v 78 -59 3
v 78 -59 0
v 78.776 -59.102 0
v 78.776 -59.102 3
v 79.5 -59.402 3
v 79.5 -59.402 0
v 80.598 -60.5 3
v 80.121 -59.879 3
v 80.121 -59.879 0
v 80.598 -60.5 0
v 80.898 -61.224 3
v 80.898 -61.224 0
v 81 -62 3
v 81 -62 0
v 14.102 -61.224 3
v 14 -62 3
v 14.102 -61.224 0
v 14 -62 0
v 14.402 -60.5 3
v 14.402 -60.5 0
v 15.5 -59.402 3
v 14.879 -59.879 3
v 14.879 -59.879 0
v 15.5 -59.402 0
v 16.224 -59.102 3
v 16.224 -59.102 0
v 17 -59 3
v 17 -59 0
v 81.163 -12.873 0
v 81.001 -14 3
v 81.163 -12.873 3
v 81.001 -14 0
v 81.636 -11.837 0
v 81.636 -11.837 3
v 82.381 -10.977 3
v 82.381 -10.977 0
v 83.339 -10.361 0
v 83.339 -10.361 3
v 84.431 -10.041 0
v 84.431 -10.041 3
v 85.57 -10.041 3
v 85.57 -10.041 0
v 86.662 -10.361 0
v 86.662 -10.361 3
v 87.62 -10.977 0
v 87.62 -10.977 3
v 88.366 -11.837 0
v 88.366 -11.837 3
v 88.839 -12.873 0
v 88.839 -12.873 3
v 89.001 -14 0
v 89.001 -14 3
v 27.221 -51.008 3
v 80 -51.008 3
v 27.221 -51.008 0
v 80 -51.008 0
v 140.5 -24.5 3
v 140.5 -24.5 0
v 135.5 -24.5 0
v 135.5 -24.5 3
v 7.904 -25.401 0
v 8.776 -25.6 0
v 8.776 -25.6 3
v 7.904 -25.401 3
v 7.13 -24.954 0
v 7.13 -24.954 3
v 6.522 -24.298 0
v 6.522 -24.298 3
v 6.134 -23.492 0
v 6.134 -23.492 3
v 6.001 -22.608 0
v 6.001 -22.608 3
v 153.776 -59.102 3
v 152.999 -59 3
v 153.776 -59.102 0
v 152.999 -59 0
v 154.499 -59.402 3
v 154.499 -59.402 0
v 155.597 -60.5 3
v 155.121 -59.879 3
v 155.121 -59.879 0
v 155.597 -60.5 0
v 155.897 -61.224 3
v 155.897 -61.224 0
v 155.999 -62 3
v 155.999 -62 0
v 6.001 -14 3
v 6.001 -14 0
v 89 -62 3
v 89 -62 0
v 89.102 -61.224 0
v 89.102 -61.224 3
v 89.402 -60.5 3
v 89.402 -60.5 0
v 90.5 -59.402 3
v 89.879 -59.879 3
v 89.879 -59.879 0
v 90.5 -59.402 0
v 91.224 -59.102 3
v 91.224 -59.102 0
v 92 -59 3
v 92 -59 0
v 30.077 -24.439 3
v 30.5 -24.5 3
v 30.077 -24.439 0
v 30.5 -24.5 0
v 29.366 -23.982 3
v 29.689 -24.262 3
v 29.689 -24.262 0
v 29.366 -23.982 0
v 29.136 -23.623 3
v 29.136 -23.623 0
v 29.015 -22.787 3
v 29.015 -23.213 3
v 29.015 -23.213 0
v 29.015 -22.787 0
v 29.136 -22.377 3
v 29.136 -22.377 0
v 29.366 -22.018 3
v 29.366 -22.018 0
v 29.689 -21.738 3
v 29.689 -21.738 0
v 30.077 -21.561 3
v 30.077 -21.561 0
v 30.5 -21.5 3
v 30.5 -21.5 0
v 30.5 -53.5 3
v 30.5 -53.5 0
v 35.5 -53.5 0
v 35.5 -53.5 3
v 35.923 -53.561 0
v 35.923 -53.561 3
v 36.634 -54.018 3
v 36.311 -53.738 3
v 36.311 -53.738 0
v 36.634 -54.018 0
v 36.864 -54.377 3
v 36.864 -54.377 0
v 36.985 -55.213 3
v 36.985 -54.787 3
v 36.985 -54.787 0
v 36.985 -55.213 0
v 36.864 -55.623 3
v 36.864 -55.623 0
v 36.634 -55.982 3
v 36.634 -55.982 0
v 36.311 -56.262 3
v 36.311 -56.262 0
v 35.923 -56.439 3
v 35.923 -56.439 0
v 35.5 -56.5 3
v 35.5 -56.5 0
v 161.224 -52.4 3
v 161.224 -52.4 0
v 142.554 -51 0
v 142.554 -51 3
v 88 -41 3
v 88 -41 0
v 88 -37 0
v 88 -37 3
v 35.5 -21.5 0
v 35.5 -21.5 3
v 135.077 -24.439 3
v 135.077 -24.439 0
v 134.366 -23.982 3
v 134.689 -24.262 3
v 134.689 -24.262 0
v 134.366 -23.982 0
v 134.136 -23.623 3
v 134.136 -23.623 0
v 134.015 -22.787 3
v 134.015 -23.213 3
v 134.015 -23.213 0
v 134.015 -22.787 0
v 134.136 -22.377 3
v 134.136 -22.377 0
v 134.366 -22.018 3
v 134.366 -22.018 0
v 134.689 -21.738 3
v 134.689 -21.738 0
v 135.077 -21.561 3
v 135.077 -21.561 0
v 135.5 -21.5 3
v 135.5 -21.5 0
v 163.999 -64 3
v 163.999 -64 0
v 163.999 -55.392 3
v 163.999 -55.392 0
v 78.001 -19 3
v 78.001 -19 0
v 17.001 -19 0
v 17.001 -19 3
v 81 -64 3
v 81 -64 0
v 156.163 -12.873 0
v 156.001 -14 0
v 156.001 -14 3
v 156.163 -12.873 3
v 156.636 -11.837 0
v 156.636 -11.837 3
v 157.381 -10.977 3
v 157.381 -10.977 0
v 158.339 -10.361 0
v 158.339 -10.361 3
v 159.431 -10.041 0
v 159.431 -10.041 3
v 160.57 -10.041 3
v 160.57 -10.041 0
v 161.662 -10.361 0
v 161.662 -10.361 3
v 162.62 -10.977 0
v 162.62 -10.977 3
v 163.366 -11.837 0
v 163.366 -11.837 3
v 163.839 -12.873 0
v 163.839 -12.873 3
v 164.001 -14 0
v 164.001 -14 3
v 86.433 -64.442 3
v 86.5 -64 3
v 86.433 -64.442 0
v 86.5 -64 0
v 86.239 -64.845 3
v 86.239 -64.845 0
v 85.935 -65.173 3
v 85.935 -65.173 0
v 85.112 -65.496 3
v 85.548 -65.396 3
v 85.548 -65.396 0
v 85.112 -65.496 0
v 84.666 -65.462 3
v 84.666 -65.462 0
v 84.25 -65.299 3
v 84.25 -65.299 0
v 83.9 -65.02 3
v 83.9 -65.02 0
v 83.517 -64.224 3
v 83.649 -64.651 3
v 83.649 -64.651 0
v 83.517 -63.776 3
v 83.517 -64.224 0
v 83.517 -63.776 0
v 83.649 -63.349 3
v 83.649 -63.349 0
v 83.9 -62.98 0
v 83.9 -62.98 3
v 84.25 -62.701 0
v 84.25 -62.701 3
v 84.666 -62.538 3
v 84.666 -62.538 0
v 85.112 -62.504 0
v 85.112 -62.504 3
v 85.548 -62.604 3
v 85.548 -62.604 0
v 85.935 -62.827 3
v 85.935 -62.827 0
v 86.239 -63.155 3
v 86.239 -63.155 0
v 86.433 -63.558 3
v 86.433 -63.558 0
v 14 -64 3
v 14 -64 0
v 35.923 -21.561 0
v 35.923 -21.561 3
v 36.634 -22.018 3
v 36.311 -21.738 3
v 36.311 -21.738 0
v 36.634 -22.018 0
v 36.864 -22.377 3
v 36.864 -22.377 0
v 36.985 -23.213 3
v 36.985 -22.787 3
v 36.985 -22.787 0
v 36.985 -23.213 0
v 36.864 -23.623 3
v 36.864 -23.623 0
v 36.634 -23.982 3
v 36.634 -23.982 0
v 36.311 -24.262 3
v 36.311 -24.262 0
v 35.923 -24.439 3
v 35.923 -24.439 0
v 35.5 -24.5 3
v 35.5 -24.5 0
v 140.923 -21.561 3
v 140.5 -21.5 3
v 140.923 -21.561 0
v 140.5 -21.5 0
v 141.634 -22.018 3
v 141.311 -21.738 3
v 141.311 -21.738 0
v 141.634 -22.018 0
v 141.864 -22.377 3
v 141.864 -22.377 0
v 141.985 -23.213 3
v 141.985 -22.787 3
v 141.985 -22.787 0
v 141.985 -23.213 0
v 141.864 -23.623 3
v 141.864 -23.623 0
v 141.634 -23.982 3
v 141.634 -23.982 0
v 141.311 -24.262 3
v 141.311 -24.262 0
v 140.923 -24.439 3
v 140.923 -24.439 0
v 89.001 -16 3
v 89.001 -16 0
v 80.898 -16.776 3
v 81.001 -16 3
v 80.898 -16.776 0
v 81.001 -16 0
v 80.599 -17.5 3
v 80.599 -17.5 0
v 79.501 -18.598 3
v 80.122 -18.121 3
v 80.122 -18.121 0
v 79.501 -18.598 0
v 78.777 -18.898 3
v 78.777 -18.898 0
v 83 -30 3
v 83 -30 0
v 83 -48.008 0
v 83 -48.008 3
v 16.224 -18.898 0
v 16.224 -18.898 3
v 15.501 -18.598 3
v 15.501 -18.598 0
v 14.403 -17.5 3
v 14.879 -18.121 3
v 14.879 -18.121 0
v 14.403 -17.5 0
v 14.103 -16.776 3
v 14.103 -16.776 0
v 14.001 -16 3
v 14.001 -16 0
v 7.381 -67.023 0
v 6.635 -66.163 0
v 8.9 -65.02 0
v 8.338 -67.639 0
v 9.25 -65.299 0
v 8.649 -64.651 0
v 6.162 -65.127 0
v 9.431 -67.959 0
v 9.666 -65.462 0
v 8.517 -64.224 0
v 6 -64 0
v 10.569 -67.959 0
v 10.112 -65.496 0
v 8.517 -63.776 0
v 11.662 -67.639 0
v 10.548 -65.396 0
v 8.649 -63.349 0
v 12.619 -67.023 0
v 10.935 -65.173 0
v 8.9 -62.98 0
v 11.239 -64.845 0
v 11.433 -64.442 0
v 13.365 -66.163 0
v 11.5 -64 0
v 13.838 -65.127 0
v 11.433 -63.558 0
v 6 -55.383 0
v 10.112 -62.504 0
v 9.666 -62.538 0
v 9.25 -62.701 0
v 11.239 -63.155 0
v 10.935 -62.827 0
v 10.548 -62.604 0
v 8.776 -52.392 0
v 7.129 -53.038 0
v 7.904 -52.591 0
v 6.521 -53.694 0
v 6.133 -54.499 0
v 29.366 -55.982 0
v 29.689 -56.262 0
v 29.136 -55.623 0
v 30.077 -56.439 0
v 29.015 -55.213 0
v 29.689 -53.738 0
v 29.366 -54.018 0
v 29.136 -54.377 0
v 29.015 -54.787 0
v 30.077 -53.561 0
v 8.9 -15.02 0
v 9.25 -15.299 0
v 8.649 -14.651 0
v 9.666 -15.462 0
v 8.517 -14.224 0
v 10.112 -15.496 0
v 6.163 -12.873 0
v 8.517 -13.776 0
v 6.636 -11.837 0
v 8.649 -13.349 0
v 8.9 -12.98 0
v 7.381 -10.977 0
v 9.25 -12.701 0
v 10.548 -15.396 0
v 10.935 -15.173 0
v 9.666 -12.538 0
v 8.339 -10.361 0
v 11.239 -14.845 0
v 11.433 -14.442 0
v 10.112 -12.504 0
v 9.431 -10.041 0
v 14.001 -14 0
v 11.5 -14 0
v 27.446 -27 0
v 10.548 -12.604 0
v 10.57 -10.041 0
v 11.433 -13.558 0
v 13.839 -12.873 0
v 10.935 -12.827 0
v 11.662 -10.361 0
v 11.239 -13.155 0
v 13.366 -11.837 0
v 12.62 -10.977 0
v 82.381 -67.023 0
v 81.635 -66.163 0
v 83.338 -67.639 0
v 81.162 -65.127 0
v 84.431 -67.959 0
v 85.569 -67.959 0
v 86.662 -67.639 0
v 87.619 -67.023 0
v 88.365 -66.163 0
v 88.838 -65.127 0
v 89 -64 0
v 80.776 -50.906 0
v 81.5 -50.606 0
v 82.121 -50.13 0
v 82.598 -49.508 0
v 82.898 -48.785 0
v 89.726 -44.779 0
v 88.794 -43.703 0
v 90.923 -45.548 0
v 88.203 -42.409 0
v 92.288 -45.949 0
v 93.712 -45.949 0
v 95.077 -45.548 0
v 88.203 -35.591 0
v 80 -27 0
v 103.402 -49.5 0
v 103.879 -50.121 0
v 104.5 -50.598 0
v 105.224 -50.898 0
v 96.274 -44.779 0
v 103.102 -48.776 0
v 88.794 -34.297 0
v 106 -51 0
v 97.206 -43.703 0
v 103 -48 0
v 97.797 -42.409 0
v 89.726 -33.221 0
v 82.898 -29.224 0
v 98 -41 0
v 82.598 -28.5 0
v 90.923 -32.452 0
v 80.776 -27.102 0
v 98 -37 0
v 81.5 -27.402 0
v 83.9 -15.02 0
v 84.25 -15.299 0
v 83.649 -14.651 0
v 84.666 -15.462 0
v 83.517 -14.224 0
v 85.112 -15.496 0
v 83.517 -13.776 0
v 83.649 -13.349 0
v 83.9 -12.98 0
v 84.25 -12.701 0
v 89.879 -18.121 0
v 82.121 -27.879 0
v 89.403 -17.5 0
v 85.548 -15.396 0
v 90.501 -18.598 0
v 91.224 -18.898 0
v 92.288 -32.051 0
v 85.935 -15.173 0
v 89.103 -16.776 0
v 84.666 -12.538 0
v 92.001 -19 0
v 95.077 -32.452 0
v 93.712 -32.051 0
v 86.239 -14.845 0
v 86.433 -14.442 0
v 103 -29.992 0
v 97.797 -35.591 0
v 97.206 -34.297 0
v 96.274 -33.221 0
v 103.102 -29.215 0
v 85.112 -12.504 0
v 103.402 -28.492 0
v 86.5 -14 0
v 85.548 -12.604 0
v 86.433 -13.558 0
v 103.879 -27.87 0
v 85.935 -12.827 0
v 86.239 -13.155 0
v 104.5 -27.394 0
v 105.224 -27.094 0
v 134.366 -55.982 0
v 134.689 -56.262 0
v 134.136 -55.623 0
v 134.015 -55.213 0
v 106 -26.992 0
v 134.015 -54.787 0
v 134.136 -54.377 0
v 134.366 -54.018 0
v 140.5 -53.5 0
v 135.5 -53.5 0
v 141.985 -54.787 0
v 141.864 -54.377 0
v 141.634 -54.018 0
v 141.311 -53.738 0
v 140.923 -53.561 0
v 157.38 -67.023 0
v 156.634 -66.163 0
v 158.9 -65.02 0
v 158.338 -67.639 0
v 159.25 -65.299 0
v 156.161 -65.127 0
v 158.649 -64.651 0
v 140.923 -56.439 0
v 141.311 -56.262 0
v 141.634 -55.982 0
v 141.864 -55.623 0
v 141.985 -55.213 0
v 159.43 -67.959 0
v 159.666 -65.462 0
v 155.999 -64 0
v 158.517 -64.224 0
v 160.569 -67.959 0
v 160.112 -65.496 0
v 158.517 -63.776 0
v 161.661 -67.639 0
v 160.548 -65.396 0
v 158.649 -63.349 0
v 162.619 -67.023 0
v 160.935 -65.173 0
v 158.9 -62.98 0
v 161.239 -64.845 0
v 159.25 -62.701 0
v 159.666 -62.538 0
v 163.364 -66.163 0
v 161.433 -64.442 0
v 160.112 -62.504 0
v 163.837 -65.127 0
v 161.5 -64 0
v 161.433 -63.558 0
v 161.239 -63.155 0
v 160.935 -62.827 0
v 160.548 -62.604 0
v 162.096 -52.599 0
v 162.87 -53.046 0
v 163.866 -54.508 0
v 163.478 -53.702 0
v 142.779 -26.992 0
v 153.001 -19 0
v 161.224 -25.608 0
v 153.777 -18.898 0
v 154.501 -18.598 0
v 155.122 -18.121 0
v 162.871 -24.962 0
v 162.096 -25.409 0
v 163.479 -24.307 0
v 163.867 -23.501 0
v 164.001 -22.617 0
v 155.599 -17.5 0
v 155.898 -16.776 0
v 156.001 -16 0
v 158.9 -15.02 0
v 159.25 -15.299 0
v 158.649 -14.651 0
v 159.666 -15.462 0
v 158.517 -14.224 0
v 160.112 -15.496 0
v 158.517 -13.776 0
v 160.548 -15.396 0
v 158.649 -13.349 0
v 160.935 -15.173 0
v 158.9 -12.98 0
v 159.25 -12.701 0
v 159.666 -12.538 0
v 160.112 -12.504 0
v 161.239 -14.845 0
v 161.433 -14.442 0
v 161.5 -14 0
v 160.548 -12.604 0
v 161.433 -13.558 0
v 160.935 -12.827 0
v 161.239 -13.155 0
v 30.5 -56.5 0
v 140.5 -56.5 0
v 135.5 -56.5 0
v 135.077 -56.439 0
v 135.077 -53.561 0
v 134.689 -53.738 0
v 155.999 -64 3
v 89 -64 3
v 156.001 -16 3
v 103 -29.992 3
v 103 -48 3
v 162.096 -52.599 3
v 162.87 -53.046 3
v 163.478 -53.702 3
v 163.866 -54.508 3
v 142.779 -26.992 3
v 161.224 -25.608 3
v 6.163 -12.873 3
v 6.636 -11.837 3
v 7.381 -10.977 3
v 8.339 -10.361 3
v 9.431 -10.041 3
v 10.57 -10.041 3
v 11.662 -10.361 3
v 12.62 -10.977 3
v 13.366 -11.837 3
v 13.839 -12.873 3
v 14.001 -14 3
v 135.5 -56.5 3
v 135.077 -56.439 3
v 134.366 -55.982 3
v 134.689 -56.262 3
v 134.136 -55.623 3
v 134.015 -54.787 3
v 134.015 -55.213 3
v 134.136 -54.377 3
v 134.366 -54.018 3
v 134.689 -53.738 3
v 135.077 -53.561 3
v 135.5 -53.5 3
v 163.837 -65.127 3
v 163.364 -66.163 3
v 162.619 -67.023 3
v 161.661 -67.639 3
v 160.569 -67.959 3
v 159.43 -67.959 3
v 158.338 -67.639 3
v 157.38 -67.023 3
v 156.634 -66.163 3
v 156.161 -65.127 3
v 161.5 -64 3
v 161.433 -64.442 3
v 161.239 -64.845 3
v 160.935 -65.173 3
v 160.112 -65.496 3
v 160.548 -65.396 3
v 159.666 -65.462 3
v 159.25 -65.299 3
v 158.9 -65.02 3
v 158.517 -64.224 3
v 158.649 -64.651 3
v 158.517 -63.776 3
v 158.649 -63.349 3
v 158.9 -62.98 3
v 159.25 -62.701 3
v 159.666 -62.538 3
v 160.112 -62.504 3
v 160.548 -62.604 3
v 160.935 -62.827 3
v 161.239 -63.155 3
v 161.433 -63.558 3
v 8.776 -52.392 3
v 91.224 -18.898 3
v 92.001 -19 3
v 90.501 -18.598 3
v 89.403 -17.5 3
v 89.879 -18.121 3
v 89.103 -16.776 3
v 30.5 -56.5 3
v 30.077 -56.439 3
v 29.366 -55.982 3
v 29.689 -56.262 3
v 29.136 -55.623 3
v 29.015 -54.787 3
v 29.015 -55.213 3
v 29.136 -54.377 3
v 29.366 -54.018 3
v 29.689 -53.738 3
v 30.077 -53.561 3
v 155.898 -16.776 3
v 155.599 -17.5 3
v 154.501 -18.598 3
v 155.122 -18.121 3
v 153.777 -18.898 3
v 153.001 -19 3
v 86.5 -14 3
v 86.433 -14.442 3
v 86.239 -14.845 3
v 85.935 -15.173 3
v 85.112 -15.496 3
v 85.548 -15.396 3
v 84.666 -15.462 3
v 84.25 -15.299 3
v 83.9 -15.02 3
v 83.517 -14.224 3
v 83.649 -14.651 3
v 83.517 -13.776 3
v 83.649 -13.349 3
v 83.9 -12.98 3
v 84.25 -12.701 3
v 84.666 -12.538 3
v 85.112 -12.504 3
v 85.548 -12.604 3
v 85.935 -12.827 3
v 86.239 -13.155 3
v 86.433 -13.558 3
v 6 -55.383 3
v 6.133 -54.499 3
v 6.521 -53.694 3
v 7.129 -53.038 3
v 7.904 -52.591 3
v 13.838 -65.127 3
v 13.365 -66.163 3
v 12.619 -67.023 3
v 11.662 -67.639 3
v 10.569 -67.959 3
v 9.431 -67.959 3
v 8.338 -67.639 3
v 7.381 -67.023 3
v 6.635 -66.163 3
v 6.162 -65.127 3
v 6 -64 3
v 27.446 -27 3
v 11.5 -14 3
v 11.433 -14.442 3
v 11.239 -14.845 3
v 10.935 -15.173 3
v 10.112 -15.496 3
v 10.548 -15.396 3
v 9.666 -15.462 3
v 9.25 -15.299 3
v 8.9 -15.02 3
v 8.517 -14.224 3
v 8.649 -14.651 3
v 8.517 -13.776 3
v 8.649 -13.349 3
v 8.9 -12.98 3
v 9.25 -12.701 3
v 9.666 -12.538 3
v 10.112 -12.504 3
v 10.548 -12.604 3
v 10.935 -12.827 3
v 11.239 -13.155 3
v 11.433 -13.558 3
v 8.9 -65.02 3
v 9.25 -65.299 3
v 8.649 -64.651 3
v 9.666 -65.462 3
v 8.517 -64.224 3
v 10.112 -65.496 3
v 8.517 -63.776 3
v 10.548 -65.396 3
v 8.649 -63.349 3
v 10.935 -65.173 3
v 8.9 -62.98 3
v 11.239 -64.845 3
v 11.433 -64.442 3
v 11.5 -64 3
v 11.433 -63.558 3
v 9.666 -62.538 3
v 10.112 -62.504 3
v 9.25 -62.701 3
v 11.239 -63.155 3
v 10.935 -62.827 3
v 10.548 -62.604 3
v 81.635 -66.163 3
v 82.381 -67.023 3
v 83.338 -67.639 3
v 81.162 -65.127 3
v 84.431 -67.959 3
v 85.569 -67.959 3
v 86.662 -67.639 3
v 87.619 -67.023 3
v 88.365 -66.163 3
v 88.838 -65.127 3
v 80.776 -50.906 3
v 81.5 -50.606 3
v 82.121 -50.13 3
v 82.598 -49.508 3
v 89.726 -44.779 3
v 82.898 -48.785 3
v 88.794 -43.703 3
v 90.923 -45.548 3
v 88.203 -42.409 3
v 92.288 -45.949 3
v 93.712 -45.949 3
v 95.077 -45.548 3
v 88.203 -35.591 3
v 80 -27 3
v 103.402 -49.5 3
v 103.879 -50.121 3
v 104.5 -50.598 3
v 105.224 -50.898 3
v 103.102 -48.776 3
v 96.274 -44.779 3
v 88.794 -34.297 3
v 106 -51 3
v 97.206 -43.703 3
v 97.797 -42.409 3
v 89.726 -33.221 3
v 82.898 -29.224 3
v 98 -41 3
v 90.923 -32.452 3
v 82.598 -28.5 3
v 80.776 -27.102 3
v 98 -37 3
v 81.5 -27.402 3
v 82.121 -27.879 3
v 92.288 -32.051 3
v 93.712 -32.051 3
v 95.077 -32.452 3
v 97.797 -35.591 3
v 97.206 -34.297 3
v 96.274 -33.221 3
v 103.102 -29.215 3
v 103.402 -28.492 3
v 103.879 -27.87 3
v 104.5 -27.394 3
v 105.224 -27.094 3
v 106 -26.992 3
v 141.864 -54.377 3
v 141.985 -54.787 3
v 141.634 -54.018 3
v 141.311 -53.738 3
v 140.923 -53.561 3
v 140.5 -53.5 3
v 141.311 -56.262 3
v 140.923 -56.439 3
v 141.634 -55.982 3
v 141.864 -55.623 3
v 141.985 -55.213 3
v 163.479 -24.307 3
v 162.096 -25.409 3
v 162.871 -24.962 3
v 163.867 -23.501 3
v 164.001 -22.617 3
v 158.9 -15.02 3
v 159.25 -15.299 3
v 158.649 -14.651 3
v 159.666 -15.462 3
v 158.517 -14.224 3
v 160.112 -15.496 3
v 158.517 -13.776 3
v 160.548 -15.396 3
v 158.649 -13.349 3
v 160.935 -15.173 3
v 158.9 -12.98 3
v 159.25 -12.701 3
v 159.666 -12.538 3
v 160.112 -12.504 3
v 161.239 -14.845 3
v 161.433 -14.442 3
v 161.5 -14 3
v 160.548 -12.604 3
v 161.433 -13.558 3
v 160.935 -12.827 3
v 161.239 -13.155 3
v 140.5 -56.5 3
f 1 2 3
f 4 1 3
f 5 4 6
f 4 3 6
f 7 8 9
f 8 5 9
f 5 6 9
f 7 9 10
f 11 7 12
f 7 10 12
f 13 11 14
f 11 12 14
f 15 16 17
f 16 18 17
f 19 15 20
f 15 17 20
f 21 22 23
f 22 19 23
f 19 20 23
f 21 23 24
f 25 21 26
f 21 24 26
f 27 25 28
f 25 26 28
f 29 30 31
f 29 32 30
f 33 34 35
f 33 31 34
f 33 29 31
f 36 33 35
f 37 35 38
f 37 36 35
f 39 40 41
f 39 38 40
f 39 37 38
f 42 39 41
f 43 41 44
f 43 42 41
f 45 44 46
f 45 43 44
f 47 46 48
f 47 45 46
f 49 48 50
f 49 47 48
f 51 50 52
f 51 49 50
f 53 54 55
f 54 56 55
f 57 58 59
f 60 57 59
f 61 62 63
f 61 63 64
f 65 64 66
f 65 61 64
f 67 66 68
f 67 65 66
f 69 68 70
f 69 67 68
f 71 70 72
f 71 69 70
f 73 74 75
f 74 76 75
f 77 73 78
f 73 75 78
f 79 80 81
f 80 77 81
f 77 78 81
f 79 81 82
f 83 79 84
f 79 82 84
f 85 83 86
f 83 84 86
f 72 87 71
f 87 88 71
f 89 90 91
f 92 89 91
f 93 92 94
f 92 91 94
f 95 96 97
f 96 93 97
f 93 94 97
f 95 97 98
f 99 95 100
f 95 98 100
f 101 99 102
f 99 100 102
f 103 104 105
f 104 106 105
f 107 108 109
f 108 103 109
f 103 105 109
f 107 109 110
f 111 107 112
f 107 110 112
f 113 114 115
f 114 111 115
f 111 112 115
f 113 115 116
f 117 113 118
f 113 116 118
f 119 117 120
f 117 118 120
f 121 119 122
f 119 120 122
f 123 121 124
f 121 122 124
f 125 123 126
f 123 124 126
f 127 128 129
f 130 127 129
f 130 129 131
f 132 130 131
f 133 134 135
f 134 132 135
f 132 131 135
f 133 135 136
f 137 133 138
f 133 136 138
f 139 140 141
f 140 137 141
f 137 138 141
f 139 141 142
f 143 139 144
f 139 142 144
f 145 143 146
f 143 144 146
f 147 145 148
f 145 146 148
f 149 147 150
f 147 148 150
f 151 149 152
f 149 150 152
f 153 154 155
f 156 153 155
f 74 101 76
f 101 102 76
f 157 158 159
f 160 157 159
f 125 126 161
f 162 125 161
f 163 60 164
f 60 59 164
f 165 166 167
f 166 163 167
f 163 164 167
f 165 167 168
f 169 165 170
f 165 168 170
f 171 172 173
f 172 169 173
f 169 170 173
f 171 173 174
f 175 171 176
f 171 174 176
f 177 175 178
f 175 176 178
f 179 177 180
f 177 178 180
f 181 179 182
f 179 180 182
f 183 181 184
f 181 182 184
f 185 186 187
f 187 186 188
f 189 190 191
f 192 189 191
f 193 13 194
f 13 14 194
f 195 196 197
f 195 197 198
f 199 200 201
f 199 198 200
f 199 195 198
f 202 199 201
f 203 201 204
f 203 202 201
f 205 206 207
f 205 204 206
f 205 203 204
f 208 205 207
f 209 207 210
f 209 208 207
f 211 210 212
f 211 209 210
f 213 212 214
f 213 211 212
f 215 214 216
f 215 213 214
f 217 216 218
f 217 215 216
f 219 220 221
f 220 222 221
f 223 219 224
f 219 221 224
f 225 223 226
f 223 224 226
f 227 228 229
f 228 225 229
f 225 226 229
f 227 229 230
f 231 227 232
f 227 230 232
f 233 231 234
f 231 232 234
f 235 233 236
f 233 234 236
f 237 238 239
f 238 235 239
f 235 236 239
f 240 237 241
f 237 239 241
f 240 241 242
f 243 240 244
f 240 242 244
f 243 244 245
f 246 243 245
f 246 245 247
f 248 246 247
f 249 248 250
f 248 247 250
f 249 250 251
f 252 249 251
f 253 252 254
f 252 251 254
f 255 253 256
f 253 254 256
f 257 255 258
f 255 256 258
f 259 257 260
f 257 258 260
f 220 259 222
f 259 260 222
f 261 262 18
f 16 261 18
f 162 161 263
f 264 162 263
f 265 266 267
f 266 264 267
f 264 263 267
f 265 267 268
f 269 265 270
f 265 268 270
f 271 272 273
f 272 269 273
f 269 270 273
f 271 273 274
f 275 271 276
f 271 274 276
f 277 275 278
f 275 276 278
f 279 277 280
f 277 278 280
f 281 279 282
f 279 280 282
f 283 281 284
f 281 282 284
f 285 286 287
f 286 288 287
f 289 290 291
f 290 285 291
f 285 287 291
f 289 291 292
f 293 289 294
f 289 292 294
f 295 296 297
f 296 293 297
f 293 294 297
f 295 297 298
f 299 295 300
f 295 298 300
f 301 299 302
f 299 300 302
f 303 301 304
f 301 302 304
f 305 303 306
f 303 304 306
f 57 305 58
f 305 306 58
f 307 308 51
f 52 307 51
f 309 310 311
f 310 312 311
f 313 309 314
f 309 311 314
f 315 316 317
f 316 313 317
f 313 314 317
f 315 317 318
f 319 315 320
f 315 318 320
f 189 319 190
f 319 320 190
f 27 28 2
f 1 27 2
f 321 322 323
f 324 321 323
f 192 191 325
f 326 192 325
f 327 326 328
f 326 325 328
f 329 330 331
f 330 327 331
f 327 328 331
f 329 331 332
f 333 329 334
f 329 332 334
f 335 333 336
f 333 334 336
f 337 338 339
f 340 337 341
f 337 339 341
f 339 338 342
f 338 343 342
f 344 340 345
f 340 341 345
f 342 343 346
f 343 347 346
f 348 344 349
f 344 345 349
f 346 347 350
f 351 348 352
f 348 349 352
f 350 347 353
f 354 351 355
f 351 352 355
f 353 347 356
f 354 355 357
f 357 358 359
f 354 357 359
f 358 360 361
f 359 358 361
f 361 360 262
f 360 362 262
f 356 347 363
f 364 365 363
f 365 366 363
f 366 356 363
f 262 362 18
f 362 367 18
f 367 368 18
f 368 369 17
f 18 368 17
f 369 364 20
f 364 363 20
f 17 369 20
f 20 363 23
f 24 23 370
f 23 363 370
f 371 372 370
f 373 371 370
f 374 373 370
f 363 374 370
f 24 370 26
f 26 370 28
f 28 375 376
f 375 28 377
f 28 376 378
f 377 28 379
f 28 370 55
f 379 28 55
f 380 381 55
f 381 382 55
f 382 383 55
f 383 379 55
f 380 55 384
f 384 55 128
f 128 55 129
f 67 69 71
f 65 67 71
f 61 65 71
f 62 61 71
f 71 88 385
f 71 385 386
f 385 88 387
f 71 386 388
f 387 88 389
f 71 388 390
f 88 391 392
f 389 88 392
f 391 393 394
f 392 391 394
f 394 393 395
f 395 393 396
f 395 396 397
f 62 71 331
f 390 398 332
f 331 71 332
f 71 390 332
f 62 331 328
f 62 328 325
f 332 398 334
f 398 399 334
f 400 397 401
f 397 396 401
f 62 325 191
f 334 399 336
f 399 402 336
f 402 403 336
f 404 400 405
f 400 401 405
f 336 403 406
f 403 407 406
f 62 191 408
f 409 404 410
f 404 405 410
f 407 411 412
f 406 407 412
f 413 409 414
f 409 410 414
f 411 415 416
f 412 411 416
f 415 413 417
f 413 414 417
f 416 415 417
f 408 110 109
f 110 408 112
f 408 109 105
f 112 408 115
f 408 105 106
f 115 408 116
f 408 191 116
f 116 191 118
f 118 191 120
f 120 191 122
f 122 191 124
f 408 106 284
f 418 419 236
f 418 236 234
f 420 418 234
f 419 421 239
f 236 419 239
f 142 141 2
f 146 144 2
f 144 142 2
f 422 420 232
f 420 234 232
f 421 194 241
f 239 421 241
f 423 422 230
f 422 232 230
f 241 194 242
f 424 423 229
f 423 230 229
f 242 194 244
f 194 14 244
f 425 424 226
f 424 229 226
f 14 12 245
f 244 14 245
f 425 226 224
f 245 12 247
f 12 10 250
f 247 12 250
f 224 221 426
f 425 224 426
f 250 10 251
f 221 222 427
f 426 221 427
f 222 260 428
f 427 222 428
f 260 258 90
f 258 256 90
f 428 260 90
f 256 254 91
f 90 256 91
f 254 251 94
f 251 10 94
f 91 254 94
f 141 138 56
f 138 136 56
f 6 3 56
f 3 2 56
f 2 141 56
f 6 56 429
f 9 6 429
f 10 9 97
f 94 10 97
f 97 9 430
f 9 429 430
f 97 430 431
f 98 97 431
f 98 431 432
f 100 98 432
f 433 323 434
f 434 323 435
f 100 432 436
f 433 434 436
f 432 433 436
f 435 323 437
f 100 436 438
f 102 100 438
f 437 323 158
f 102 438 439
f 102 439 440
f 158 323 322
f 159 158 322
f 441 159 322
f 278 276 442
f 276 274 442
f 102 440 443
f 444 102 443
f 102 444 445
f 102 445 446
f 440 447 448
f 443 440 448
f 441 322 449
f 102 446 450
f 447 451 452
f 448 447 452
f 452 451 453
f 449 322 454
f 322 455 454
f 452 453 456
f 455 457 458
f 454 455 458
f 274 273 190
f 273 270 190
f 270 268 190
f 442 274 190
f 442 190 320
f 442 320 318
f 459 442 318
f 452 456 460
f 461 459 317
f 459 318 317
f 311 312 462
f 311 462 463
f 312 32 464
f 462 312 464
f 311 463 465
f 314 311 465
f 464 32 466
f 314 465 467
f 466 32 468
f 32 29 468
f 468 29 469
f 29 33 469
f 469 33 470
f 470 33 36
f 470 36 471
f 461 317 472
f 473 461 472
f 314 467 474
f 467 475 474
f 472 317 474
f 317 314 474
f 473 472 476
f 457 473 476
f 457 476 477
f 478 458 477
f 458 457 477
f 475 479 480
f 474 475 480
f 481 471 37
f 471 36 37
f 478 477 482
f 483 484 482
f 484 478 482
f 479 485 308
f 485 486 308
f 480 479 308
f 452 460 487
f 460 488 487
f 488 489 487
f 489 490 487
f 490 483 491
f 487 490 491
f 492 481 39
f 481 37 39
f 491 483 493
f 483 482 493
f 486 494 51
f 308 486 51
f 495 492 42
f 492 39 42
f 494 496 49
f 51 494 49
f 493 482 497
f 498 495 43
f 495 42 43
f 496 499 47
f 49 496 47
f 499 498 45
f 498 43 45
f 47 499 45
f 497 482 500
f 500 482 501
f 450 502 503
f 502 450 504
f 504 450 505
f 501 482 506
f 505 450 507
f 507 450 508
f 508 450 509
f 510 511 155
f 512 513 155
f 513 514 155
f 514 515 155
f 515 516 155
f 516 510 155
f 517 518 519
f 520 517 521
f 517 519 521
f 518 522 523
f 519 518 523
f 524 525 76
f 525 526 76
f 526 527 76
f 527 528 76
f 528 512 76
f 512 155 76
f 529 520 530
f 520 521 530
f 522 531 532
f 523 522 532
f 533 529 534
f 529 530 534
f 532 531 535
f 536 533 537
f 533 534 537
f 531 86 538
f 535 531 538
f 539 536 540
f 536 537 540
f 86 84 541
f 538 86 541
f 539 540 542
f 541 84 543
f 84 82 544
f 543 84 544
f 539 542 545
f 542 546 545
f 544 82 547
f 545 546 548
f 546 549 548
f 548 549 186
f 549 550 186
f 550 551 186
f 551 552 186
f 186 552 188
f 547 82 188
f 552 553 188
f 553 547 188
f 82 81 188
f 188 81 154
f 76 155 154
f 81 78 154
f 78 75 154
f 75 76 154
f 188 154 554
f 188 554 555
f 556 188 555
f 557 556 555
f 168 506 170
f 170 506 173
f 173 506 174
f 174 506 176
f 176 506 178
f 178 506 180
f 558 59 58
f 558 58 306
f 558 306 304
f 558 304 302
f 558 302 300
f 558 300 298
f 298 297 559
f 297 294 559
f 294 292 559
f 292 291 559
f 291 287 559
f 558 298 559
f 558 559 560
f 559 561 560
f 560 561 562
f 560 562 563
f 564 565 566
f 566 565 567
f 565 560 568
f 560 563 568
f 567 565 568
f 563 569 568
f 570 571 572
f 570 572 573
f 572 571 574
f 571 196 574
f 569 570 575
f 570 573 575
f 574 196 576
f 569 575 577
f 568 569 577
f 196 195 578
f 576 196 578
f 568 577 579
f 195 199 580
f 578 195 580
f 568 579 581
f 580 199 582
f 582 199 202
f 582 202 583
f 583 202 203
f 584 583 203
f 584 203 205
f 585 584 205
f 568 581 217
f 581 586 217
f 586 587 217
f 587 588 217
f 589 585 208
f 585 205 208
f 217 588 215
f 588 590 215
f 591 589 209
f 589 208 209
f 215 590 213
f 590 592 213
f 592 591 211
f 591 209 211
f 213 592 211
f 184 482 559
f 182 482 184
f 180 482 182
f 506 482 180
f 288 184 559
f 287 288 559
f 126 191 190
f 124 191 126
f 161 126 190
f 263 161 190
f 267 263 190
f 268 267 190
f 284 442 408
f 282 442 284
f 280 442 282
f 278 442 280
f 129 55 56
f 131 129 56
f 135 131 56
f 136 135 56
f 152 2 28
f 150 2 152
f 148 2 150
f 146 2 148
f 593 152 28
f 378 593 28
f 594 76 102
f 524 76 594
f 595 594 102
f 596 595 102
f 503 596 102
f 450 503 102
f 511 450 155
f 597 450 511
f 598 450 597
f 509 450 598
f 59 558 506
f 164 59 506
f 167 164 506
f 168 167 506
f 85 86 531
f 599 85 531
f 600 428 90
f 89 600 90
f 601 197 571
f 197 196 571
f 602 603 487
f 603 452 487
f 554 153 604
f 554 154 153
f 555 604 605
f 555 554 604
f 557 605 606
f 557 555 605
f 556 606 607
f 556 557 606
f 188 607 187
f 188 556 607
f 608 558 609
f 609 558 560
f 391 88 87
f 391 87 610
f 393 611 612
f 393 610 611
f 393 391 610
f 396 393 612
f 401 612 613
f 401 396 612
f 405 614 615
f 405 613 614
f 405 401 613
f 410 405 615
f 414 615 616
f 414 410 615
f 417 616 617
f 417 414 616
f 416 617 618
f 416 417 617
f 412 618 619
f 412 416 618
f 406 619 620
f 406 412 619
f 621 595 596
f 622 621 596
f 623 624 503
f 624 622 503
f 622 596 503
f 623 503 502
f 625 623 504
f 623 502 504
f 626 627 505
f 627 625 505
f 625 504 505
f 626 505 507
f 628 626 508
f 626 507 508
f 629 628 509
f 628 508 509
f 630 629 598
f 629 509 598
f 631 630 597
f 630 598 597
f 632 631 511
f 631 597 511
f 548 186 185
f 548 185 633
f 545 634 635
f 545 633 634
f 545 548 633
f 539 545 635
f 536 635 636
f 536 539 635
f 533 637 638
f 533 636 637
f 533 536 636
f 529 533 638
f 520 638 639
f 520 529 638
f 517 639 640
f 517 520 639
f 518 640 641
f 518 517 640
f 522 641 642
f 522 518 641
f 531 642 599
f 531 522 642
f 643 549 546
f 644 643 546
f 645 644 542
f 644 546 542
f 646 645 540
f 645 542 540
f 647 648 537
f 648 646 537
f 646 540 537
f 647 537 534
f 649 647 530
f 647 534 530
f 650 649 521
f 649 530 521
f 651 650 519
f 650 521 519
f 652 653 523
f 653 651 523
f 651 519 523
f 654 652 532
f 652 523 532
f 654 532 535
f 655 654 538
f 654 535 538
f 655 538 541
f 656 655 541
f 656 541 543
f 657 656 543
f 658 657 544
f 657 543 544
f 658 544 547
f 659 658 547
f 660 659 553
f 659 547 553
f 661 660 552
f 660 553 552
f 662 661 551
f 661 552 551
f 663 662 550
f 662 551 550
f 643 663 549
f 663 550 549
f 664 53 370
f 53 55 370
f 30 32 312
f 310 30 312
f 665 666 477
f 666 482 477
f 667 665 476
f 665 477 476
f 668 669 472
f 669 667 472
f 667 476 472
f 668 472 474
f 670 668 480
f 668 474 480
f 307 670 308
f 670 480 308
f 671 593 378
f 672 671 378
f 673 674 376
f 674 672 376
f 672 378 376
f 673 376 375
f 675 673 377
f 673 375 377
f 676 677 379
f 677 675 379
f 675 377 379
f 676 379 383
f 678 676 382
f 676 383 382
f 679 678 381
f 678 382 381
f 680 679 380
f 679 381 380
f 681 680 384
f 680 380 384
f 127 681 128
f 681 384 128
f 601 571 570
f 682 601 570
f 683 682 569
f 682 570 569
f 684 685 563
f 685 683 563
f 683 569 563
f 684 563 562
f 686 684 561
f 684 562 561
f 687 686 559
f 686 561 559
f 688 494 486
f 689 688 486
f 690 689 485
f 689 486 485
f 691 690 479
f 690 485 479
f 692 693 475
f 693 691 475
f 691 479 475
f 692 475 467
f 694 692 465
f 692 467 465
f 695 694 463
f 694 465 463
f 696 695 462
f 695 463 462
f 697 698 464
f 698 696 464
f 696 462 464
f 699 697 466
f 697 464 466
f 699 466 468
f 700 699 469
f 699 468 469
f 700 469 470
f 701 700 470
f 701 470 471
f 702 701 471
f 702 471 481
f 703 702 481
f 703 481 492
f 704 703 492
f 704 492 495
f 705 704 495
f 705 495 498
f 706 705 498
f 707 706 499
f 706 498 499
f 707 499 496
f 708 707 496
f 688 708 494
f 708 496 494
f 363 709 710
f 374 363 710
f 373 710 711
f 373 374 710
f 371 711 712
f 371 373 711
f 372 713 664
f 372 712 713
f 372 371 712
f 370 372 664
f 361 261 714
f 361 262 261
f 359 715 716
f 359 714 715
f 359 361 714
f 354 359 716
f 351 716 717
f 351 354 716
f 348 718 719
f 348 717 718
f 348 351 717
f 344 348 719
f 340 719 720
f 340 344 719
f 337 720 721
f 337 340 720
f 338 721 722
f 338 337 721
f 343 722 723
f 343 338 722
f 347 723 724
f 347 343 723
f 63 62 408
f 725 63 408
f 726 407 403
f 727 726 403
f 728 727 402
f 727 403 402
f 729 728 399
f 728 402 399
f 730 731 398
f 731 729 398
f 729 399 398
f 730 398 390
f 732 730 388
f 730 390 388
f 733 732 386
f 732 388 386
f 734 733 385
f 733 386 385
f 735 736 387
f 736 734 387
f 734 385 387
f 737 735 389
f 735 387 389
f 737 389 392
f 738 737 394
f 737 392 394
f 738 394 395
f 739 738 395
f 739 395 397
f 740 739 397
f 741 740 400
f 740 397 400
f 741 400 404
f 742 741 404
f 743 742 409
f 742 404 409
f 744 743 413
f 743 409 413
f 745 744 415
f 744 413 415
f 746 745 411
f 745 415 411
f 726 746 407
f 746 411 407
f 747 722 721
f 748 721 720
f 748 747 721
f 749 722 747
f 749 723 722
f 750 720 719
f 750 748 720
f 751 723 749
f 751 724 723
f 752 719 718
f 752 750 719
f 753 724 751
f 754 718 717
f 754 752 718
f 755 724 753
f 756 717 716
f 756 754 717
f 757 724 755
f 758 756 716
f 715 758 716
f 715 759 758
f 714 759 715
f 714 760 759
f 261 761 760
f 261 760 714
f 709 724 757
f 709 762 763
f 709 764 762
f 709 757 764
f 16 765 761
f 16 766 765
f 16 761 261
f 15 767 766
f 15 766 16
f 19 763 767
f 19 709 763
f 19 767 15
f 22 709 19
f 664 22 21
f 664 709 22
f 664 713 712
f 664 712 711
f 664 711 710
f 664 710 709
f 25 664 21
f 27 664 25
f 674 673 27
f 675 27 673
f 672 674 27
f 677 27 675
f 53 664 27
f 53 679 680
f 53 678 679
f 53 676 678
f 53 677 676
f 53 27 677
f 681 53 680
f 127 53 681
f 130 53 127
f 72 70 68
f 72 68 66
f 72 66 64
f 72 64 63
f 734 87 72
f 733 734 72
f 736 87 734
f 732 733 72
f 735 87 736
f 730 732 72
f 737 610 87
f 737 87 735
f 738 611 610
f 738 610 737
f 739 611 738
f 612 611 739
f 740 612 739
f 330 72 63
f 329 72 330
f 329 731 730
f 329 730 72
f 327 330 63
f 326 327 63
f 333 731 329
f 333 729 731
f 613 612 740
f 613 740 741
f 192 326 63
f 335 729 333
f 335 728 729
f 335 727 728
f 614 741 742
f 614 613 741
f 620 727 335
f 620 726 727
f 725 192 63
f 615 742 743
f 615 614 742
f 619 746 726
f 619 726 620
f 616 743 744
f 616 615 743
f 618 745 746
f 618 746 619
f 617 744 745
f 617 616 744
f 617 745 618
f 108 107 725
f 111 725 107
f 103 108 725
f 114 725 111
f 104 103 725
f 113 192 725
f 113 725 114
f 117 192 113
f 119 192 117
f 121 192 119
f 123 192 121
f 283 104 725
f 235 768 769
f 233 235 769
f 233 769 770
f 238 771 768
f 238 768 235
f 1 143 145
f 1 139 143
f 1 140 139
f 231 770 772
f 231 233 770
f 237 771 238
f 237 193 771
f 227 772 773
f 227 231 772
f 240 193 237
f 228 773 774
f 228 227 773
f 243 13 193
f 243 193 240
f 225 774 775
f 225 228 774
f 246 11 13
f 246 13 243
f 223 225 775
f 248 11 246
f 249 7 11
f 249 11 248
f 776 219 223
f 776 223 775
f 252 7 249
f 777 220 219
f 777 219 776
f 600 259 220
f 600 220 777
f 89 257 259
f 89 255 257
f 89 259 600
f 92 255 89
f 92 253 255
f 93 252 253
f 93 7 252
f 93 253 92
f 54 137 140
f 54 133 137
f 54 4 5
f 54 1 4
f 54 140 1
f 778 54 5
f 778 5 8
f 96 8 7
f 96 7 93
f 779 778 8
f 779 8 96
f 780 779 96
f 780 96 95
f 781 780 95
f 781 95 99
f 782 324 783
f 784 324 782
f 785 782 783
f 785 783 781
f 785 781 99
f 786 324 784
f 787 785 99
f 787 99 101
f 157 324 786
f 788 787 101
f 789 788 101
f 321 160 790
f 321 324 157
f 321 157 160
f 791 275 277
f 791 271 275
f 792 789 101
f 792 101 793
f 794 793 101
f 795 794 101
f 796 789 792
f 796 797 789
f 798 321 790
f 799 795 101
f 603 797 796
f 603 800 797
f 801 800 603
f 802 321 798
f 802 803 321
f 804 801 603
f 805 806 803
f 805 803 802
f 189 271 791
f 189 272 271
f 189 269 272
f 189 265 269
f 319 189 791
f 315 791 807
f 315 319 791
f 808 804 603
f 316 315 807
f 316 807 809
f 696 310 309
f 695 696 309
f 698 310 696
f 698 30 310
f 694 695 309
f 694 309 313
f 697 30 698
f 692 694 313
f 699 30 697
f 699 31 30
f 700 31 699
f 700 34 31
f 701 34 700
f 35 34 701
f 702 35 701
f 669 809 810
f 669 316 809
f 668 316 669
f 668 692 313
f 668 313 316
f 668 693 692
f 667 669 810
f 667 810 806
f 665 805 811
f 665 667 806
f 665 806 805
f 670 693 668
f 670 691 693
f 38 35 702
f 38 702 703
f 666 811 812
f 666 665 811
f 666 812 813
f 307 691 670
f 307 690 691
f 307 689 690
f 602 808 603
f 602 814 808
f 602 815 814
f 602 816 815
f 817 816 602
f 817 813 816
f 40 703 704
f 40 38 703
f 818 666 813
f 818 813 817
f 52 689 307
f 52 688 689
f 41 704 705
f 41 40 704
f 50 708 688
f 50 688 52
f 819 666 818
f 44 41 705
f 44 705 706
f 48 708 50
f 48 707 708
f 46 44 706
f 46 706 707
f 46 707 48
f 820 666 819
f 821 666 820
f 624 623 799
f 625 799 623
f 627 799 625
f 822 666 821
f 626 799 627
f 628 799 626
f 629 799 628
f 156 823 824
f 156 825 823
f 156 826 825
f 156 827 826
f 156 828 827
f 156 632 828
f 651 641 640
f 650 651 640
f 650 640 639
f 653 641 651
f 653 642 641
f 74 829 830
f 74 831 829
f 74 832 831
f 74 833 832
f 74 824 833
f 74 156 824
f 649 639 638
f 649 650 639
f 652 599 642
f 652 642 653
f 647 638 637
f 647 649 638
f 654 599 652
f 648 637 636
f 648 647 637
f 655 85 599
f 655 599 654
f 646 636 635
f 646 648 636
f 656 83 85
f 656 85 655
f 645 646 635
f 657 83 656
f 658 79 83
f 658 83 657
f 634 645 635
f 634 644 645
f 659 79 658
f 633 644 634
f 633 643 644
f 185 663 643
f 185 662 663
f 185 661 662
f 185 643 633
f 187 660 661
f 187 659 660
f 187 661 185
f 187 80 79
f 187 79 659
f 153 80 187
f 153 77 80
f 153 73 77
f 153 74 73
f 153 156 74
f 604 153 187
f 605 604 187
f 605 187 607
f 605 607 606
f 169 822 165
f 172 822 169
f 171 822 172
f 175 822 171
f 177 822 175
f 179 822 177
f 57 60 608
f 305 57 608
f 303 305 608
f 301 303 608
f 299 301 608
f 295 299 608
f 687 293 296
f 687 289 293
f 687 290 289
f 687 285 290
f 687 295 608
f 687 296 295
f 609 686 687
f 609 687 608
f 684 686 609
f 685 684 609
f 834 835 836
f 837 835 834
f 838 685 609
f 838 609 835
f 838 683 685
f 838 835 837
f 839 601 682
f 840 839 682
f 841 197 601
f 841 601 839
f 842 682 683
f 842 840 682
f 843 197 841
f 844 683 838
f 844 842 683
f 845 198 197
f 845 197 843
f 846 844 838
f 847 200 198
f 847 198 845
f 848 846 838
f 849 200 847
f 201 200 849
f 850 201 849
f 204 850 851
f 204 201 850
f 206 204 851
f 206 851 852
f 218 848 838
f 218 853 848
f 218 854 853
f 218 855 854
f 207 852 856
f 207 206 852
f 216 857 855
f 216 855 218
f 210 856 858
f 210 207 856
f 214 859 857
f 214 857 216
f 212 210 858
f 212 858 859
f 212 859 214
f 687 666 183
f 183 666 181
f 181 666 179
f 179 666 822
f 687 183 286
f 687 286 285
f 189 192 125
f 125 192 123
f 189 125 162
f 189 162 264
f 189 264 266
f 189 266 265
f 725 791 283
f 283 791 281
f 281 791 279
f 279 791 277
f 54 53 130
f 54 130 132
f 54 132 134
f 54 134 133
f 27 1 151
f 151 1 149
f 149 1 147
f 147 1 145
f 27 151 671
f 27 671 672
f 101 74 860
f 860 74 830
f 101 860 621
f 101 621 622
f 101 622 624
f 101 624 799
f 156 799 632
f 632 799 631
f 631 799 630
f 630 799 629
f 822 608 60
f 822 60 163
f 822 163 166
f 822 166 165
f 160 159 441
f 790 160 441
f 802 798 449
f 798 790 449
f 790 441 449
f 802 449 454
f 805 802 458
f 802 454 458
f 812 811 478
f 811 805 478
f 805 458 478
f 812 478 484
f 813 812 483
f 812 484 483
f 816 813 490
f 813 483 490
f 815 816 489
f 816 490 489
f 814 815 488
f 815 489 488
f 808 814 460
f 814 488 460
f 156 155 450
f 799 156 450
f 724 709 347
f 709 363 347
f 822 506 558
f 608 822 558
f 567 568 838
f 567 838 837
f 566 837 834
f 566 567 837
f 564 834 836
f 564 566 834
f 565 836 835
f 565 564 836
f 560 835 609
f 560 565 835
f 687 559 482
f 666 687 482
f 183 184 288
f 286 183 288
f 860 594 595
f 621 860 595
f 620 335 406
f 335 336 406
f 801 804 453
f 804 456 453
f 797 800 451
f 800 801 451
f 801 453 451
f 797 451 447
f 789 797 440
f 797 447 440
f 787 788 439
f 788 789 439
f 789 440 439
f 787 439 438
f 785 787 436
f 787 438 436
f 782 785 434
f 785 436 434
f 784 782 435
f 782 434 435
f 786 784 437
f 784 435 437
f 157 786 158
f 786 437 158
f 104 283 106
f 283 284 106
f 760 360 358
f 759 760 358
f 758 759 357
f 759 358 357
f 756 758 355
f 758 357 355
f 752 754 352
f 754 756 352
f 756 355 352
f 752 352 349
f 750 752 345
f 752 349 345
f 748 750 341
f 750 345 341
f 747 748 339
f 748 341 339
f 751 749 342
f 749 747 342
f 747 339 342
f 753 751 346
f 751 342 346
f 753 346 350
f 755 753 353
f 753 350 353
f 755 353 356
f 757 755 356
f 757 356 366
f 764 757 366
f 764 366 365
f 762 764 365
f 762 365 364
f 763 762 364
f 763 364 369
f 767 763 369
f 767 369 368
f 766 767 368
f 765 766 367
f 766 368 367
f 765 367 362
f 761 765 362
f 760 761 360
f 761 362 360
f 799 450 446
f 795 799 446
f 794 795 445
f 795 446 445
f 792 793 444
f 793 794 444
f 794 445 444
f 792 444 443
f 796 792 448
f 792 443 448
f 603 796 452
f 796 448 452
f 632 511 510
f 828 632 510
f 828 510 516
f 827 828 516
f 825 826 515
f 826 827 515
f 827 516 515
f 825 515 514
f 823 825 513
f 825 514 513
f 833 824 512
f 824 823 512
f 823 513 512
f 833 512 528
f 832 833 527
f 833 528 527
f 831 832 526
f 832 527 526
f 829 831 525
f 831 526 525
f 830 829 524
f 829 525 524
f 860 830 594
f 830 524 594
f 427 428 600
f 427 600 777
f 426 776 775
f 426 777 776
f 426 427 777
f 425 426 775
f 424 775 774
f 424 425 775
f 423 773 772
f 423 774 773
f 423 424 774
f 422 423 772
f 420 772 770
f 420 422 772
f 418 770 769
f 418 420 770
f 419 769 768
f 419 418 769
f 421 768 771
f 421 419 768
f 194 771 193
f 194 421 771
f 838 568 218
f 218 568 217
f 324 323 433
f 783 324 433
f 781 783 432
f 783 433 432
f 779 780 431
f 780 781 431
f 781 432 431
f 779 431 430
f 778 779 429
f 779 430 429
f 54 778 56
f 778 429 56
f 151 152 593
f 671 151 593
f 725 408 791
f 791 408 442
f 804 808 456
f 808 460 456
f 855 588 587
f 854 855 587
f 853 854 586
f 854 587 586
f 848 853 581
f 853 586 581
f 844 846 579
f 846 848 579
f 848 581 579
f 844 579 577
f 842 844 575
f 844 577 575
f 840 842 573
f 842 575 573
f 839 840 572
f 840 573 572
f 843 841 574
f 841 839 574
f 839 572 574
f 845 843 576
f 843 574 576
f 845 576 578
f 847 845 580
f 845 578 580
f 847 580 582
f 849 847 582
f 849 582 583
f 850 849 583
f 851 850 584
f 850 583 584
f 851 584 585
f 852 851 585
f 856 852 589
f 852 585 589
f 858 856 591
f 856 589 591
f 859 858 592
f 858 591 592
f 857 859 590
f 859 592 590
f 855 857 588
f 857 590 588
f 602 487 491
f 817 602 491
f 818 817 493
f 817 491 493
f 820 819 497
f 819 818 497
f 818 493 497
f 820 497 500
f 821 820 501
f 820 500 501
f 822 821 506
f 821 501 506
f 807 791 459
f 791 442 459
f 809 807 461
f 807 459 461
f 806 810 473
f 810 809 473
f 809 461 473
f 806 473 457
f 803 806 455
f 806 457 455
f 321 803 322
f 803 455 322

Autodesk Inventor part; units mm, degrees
ref_plane "YZ Plane" through (0, 0, 0) normal (1, 0, 0) x (0, 1, 0)
ref_plane "XZ Plane" through (0, 0, 0) normal (0, 1, 0) x (-1, 0, 0)
ref_plane "XY Plane" through (0, 0, 0) normal (0, 0, 1) x (1, 0, 0)
sketch "Sketch1" plane through (0, 0, 0) normal (0, 0, 1) x (1, 0, 0)
  line L0 (135.5, -53.5) -> (140.5, -53.5)
  arc A0 (140.5, -56.5) -> (140.5, -53.5) centre (140.5, -55) ccw
  line L1 (140.5, -56.5) -> (135.5, -56.5)
  arc A1 (135.5, -53.5) -> (135.5, -56.5) centre (135.5, -55) ccw
  line L2 (30.5, -21.5) -> (35.5, -21.5)
  arc A2 (35.5, -24.5) -> (35.5, -21.5) centre (35.5, -23) ccw
  line L3 (35.5, -24.5) -> (30.5, -24.5)
  arc A3 (30.5, -21.5) -> (30.5, -24.5) centre (30.5, -23) ccw
  line L4 (35.5, -56.5) -> (30.5, -56.5)
  arc A4 (30.5, -53.5) -> (30.5, -56.5) centre (30.5, -55) ccw
  line L5 (30.5, -53.5) -> (35.5, -53.5)
  arc A5 (35.5, -56.5) -> (35.5, -53.5) centre (35.5, -55) ccw
  line L6 (140.5, -24.5) -> (135.5, -24.5)
  arc A6 (135.5, -21.5) -> (135.5, -24.5) centre (135.5, -23) ccw
  line L7 (135.5, -21.5) -> (140.5, -21.5)
  arc A7 (140.5, -24.5) -> (140.5, -21.5) centre (140.5, -23) ccw
  arc A8 (6.0006, -22.6082) -> (8.7763, -25.5998) centre (9.0006, -22.6082) ccw
  line L8 (8.7763, -25.5998) -> (27.4457, -27)
  arc A9 (27.2213, -26.9916) -> (27.4457, -27) centre (27.4457, -24) ccw
  line L9 (27.4457, -27) -> (80, -27)
  arc A10 (83, -30) -> (80, -27) centre (80, -30) ccw
  line L10 (83, -30) -> (83, -48.0084)
  arc A11 (80, -51.0084) -> (83, -48.0084) centre (80, -48.0084) ccw
  line L11 (80, -51.0084) -> (27.2213, -51.0084)
  arc A12 (27.4457, -51) -> (27.2213, -51.0084) centre (27.4457, -54) ccw
  line L12 (27.2213, -51.0084) -> (8.7756, -52.3918)
  arc A13 (8.7756, -52.3918) -> (6, -55.3834) centre (9, -55.3834) ccw
  line L13 (6, -55.3834) -> (6, -64)
  arc A14 (6, -64) -> (14, -64) centre (10, -64) ccw
  line L14 (14, -64) -> (14, -62)
  arc A15 (17, -59) -> (14, -62) centre (17, -62) ccw
  line L15 (17, -59) -> (78, -59)
  arc A16 (81, -62) -> (78, -59) centre (78, -62) ccw
  line L16 (81, -62) -> (81, -64)
  arc A17 (81, -64) -> (89, -64) centre (85, -64) ccw
  line L17 (89, -64) -> (89, -62)
  arc A18 (92, -59) -> (89, -62) centre (92, -62) ccw
  line L18 (92, -59) -> (152.9994, -59)
  arc A19 (155.9994, -62) -> (152.9994, -59) centre (152.9994, -62) ccw
  line L19 (155.9994, -62) -> (155.9994, -64)
  arc A20 (155.9994, -64) -> (163.9994, -64) centre (159.9994, -64) ccw
  line L20 (163.9994, -64) -> (163.9994, -55.3918)
  arc A21 (163.9994, -55.3918) -> (161.2237, -52.4002) centre (160.9994, -55.3918) ccw
  line L21 (161.2237, -52.4002) -> (142.5543, -51)
  arc A22 (142.7787, -51.0084) -> (142.5543, -51) centre (142.5543, -54) ccw
  line L22 (142.5543, -51) -> (106, -51)
  arc A23 (103, -48) -> (106, -51) centre (106, -48) ccw
  line L23 (103, -48) -> (103, -29.9916)
  arc A24 (106, -26.9916) -> (103, -29.9916) centre (106, -29.9916) ccw
  line L24 (106, -26.9916) -> (142.7787, -26.9916)
  arc A25 (142.5543, -27) -> (142.7787, -26.9916) centre (142.5543, -24) ccw
  line L25 (142.7787, -26.9916) -> (161.2244, -25.6082)
  arc A26 (161.2244, -25.6082) -> (164.0006, -22.6166) centre (161.0006, -22.6165) ccw
  line L26 (164.0006, -22.6166) -> (164.0006, -14)
  arc A27 (164.0006, -14) -> (156.0006, -14) centre (160.0006, -14) ccw
  line L27 (156.0006, -14) -> (156.0006, -16)
  arc A28 (153.0006, -19) -> (156.0006, -16) centre (153.0006, -16) ccw
  line L28 (153.0006, -19) -> (92.0006, -19)
  arc A29 (89.0006, -16) -> (92.0006, -19) centre (92.0006, -16) ccw
  line L29 (89.0006, -16) -> (89.0006, -14)
  arc A30 (89.0006, -14) -> (81.0006, -14) centre (85.0006, -14) ccw
  line L30 (81.0006, -14) -> (81.0006, -16)
  arc A31 (78.0006, -19) -> (81.0006, -16) centre (78.0006, -16) ccw
  line L31 (78.0006, -19) -> (17.0006, -19)
  arc A32 (14.0006, -16) -> (17.0006, -19) centre (17.0006, -16) ccw
  line L32 (14.0006, -16) -> (14.0006, -14)
  arc A33 (14.0006, -14) -> (6.0006, -14) centre (10.0006, -14) ccw
  line L33 (6.0006, -14) -> (6.0006, -22.6082)
  arc A34 (98, -37) -> (88, -37) centre (93, -37) ccw
  line L34 (98, -37) -> (98, -41)
  arc A35 (88, -41) -> (98, -41) centre (93, -41) ccw
  line L35 (88, -41) -> (88, -37)
  circle A36 centre (10, -14) radius 1.5
  circle A37 centre (10, -64) radius 1.5
  circle A38 centre (85, -64) radius 1.5
  circle A39 centre (85, -14) radius 1.5
  circle A40 centre (160, -14) radius 1.5
  circle A41 centre (160, -64) radius 1.5
  point P0 (0, 0)
extrude "Extrusion1" add sketch "Sketch1" along normal blind 3
properties part number "updown_slider"
